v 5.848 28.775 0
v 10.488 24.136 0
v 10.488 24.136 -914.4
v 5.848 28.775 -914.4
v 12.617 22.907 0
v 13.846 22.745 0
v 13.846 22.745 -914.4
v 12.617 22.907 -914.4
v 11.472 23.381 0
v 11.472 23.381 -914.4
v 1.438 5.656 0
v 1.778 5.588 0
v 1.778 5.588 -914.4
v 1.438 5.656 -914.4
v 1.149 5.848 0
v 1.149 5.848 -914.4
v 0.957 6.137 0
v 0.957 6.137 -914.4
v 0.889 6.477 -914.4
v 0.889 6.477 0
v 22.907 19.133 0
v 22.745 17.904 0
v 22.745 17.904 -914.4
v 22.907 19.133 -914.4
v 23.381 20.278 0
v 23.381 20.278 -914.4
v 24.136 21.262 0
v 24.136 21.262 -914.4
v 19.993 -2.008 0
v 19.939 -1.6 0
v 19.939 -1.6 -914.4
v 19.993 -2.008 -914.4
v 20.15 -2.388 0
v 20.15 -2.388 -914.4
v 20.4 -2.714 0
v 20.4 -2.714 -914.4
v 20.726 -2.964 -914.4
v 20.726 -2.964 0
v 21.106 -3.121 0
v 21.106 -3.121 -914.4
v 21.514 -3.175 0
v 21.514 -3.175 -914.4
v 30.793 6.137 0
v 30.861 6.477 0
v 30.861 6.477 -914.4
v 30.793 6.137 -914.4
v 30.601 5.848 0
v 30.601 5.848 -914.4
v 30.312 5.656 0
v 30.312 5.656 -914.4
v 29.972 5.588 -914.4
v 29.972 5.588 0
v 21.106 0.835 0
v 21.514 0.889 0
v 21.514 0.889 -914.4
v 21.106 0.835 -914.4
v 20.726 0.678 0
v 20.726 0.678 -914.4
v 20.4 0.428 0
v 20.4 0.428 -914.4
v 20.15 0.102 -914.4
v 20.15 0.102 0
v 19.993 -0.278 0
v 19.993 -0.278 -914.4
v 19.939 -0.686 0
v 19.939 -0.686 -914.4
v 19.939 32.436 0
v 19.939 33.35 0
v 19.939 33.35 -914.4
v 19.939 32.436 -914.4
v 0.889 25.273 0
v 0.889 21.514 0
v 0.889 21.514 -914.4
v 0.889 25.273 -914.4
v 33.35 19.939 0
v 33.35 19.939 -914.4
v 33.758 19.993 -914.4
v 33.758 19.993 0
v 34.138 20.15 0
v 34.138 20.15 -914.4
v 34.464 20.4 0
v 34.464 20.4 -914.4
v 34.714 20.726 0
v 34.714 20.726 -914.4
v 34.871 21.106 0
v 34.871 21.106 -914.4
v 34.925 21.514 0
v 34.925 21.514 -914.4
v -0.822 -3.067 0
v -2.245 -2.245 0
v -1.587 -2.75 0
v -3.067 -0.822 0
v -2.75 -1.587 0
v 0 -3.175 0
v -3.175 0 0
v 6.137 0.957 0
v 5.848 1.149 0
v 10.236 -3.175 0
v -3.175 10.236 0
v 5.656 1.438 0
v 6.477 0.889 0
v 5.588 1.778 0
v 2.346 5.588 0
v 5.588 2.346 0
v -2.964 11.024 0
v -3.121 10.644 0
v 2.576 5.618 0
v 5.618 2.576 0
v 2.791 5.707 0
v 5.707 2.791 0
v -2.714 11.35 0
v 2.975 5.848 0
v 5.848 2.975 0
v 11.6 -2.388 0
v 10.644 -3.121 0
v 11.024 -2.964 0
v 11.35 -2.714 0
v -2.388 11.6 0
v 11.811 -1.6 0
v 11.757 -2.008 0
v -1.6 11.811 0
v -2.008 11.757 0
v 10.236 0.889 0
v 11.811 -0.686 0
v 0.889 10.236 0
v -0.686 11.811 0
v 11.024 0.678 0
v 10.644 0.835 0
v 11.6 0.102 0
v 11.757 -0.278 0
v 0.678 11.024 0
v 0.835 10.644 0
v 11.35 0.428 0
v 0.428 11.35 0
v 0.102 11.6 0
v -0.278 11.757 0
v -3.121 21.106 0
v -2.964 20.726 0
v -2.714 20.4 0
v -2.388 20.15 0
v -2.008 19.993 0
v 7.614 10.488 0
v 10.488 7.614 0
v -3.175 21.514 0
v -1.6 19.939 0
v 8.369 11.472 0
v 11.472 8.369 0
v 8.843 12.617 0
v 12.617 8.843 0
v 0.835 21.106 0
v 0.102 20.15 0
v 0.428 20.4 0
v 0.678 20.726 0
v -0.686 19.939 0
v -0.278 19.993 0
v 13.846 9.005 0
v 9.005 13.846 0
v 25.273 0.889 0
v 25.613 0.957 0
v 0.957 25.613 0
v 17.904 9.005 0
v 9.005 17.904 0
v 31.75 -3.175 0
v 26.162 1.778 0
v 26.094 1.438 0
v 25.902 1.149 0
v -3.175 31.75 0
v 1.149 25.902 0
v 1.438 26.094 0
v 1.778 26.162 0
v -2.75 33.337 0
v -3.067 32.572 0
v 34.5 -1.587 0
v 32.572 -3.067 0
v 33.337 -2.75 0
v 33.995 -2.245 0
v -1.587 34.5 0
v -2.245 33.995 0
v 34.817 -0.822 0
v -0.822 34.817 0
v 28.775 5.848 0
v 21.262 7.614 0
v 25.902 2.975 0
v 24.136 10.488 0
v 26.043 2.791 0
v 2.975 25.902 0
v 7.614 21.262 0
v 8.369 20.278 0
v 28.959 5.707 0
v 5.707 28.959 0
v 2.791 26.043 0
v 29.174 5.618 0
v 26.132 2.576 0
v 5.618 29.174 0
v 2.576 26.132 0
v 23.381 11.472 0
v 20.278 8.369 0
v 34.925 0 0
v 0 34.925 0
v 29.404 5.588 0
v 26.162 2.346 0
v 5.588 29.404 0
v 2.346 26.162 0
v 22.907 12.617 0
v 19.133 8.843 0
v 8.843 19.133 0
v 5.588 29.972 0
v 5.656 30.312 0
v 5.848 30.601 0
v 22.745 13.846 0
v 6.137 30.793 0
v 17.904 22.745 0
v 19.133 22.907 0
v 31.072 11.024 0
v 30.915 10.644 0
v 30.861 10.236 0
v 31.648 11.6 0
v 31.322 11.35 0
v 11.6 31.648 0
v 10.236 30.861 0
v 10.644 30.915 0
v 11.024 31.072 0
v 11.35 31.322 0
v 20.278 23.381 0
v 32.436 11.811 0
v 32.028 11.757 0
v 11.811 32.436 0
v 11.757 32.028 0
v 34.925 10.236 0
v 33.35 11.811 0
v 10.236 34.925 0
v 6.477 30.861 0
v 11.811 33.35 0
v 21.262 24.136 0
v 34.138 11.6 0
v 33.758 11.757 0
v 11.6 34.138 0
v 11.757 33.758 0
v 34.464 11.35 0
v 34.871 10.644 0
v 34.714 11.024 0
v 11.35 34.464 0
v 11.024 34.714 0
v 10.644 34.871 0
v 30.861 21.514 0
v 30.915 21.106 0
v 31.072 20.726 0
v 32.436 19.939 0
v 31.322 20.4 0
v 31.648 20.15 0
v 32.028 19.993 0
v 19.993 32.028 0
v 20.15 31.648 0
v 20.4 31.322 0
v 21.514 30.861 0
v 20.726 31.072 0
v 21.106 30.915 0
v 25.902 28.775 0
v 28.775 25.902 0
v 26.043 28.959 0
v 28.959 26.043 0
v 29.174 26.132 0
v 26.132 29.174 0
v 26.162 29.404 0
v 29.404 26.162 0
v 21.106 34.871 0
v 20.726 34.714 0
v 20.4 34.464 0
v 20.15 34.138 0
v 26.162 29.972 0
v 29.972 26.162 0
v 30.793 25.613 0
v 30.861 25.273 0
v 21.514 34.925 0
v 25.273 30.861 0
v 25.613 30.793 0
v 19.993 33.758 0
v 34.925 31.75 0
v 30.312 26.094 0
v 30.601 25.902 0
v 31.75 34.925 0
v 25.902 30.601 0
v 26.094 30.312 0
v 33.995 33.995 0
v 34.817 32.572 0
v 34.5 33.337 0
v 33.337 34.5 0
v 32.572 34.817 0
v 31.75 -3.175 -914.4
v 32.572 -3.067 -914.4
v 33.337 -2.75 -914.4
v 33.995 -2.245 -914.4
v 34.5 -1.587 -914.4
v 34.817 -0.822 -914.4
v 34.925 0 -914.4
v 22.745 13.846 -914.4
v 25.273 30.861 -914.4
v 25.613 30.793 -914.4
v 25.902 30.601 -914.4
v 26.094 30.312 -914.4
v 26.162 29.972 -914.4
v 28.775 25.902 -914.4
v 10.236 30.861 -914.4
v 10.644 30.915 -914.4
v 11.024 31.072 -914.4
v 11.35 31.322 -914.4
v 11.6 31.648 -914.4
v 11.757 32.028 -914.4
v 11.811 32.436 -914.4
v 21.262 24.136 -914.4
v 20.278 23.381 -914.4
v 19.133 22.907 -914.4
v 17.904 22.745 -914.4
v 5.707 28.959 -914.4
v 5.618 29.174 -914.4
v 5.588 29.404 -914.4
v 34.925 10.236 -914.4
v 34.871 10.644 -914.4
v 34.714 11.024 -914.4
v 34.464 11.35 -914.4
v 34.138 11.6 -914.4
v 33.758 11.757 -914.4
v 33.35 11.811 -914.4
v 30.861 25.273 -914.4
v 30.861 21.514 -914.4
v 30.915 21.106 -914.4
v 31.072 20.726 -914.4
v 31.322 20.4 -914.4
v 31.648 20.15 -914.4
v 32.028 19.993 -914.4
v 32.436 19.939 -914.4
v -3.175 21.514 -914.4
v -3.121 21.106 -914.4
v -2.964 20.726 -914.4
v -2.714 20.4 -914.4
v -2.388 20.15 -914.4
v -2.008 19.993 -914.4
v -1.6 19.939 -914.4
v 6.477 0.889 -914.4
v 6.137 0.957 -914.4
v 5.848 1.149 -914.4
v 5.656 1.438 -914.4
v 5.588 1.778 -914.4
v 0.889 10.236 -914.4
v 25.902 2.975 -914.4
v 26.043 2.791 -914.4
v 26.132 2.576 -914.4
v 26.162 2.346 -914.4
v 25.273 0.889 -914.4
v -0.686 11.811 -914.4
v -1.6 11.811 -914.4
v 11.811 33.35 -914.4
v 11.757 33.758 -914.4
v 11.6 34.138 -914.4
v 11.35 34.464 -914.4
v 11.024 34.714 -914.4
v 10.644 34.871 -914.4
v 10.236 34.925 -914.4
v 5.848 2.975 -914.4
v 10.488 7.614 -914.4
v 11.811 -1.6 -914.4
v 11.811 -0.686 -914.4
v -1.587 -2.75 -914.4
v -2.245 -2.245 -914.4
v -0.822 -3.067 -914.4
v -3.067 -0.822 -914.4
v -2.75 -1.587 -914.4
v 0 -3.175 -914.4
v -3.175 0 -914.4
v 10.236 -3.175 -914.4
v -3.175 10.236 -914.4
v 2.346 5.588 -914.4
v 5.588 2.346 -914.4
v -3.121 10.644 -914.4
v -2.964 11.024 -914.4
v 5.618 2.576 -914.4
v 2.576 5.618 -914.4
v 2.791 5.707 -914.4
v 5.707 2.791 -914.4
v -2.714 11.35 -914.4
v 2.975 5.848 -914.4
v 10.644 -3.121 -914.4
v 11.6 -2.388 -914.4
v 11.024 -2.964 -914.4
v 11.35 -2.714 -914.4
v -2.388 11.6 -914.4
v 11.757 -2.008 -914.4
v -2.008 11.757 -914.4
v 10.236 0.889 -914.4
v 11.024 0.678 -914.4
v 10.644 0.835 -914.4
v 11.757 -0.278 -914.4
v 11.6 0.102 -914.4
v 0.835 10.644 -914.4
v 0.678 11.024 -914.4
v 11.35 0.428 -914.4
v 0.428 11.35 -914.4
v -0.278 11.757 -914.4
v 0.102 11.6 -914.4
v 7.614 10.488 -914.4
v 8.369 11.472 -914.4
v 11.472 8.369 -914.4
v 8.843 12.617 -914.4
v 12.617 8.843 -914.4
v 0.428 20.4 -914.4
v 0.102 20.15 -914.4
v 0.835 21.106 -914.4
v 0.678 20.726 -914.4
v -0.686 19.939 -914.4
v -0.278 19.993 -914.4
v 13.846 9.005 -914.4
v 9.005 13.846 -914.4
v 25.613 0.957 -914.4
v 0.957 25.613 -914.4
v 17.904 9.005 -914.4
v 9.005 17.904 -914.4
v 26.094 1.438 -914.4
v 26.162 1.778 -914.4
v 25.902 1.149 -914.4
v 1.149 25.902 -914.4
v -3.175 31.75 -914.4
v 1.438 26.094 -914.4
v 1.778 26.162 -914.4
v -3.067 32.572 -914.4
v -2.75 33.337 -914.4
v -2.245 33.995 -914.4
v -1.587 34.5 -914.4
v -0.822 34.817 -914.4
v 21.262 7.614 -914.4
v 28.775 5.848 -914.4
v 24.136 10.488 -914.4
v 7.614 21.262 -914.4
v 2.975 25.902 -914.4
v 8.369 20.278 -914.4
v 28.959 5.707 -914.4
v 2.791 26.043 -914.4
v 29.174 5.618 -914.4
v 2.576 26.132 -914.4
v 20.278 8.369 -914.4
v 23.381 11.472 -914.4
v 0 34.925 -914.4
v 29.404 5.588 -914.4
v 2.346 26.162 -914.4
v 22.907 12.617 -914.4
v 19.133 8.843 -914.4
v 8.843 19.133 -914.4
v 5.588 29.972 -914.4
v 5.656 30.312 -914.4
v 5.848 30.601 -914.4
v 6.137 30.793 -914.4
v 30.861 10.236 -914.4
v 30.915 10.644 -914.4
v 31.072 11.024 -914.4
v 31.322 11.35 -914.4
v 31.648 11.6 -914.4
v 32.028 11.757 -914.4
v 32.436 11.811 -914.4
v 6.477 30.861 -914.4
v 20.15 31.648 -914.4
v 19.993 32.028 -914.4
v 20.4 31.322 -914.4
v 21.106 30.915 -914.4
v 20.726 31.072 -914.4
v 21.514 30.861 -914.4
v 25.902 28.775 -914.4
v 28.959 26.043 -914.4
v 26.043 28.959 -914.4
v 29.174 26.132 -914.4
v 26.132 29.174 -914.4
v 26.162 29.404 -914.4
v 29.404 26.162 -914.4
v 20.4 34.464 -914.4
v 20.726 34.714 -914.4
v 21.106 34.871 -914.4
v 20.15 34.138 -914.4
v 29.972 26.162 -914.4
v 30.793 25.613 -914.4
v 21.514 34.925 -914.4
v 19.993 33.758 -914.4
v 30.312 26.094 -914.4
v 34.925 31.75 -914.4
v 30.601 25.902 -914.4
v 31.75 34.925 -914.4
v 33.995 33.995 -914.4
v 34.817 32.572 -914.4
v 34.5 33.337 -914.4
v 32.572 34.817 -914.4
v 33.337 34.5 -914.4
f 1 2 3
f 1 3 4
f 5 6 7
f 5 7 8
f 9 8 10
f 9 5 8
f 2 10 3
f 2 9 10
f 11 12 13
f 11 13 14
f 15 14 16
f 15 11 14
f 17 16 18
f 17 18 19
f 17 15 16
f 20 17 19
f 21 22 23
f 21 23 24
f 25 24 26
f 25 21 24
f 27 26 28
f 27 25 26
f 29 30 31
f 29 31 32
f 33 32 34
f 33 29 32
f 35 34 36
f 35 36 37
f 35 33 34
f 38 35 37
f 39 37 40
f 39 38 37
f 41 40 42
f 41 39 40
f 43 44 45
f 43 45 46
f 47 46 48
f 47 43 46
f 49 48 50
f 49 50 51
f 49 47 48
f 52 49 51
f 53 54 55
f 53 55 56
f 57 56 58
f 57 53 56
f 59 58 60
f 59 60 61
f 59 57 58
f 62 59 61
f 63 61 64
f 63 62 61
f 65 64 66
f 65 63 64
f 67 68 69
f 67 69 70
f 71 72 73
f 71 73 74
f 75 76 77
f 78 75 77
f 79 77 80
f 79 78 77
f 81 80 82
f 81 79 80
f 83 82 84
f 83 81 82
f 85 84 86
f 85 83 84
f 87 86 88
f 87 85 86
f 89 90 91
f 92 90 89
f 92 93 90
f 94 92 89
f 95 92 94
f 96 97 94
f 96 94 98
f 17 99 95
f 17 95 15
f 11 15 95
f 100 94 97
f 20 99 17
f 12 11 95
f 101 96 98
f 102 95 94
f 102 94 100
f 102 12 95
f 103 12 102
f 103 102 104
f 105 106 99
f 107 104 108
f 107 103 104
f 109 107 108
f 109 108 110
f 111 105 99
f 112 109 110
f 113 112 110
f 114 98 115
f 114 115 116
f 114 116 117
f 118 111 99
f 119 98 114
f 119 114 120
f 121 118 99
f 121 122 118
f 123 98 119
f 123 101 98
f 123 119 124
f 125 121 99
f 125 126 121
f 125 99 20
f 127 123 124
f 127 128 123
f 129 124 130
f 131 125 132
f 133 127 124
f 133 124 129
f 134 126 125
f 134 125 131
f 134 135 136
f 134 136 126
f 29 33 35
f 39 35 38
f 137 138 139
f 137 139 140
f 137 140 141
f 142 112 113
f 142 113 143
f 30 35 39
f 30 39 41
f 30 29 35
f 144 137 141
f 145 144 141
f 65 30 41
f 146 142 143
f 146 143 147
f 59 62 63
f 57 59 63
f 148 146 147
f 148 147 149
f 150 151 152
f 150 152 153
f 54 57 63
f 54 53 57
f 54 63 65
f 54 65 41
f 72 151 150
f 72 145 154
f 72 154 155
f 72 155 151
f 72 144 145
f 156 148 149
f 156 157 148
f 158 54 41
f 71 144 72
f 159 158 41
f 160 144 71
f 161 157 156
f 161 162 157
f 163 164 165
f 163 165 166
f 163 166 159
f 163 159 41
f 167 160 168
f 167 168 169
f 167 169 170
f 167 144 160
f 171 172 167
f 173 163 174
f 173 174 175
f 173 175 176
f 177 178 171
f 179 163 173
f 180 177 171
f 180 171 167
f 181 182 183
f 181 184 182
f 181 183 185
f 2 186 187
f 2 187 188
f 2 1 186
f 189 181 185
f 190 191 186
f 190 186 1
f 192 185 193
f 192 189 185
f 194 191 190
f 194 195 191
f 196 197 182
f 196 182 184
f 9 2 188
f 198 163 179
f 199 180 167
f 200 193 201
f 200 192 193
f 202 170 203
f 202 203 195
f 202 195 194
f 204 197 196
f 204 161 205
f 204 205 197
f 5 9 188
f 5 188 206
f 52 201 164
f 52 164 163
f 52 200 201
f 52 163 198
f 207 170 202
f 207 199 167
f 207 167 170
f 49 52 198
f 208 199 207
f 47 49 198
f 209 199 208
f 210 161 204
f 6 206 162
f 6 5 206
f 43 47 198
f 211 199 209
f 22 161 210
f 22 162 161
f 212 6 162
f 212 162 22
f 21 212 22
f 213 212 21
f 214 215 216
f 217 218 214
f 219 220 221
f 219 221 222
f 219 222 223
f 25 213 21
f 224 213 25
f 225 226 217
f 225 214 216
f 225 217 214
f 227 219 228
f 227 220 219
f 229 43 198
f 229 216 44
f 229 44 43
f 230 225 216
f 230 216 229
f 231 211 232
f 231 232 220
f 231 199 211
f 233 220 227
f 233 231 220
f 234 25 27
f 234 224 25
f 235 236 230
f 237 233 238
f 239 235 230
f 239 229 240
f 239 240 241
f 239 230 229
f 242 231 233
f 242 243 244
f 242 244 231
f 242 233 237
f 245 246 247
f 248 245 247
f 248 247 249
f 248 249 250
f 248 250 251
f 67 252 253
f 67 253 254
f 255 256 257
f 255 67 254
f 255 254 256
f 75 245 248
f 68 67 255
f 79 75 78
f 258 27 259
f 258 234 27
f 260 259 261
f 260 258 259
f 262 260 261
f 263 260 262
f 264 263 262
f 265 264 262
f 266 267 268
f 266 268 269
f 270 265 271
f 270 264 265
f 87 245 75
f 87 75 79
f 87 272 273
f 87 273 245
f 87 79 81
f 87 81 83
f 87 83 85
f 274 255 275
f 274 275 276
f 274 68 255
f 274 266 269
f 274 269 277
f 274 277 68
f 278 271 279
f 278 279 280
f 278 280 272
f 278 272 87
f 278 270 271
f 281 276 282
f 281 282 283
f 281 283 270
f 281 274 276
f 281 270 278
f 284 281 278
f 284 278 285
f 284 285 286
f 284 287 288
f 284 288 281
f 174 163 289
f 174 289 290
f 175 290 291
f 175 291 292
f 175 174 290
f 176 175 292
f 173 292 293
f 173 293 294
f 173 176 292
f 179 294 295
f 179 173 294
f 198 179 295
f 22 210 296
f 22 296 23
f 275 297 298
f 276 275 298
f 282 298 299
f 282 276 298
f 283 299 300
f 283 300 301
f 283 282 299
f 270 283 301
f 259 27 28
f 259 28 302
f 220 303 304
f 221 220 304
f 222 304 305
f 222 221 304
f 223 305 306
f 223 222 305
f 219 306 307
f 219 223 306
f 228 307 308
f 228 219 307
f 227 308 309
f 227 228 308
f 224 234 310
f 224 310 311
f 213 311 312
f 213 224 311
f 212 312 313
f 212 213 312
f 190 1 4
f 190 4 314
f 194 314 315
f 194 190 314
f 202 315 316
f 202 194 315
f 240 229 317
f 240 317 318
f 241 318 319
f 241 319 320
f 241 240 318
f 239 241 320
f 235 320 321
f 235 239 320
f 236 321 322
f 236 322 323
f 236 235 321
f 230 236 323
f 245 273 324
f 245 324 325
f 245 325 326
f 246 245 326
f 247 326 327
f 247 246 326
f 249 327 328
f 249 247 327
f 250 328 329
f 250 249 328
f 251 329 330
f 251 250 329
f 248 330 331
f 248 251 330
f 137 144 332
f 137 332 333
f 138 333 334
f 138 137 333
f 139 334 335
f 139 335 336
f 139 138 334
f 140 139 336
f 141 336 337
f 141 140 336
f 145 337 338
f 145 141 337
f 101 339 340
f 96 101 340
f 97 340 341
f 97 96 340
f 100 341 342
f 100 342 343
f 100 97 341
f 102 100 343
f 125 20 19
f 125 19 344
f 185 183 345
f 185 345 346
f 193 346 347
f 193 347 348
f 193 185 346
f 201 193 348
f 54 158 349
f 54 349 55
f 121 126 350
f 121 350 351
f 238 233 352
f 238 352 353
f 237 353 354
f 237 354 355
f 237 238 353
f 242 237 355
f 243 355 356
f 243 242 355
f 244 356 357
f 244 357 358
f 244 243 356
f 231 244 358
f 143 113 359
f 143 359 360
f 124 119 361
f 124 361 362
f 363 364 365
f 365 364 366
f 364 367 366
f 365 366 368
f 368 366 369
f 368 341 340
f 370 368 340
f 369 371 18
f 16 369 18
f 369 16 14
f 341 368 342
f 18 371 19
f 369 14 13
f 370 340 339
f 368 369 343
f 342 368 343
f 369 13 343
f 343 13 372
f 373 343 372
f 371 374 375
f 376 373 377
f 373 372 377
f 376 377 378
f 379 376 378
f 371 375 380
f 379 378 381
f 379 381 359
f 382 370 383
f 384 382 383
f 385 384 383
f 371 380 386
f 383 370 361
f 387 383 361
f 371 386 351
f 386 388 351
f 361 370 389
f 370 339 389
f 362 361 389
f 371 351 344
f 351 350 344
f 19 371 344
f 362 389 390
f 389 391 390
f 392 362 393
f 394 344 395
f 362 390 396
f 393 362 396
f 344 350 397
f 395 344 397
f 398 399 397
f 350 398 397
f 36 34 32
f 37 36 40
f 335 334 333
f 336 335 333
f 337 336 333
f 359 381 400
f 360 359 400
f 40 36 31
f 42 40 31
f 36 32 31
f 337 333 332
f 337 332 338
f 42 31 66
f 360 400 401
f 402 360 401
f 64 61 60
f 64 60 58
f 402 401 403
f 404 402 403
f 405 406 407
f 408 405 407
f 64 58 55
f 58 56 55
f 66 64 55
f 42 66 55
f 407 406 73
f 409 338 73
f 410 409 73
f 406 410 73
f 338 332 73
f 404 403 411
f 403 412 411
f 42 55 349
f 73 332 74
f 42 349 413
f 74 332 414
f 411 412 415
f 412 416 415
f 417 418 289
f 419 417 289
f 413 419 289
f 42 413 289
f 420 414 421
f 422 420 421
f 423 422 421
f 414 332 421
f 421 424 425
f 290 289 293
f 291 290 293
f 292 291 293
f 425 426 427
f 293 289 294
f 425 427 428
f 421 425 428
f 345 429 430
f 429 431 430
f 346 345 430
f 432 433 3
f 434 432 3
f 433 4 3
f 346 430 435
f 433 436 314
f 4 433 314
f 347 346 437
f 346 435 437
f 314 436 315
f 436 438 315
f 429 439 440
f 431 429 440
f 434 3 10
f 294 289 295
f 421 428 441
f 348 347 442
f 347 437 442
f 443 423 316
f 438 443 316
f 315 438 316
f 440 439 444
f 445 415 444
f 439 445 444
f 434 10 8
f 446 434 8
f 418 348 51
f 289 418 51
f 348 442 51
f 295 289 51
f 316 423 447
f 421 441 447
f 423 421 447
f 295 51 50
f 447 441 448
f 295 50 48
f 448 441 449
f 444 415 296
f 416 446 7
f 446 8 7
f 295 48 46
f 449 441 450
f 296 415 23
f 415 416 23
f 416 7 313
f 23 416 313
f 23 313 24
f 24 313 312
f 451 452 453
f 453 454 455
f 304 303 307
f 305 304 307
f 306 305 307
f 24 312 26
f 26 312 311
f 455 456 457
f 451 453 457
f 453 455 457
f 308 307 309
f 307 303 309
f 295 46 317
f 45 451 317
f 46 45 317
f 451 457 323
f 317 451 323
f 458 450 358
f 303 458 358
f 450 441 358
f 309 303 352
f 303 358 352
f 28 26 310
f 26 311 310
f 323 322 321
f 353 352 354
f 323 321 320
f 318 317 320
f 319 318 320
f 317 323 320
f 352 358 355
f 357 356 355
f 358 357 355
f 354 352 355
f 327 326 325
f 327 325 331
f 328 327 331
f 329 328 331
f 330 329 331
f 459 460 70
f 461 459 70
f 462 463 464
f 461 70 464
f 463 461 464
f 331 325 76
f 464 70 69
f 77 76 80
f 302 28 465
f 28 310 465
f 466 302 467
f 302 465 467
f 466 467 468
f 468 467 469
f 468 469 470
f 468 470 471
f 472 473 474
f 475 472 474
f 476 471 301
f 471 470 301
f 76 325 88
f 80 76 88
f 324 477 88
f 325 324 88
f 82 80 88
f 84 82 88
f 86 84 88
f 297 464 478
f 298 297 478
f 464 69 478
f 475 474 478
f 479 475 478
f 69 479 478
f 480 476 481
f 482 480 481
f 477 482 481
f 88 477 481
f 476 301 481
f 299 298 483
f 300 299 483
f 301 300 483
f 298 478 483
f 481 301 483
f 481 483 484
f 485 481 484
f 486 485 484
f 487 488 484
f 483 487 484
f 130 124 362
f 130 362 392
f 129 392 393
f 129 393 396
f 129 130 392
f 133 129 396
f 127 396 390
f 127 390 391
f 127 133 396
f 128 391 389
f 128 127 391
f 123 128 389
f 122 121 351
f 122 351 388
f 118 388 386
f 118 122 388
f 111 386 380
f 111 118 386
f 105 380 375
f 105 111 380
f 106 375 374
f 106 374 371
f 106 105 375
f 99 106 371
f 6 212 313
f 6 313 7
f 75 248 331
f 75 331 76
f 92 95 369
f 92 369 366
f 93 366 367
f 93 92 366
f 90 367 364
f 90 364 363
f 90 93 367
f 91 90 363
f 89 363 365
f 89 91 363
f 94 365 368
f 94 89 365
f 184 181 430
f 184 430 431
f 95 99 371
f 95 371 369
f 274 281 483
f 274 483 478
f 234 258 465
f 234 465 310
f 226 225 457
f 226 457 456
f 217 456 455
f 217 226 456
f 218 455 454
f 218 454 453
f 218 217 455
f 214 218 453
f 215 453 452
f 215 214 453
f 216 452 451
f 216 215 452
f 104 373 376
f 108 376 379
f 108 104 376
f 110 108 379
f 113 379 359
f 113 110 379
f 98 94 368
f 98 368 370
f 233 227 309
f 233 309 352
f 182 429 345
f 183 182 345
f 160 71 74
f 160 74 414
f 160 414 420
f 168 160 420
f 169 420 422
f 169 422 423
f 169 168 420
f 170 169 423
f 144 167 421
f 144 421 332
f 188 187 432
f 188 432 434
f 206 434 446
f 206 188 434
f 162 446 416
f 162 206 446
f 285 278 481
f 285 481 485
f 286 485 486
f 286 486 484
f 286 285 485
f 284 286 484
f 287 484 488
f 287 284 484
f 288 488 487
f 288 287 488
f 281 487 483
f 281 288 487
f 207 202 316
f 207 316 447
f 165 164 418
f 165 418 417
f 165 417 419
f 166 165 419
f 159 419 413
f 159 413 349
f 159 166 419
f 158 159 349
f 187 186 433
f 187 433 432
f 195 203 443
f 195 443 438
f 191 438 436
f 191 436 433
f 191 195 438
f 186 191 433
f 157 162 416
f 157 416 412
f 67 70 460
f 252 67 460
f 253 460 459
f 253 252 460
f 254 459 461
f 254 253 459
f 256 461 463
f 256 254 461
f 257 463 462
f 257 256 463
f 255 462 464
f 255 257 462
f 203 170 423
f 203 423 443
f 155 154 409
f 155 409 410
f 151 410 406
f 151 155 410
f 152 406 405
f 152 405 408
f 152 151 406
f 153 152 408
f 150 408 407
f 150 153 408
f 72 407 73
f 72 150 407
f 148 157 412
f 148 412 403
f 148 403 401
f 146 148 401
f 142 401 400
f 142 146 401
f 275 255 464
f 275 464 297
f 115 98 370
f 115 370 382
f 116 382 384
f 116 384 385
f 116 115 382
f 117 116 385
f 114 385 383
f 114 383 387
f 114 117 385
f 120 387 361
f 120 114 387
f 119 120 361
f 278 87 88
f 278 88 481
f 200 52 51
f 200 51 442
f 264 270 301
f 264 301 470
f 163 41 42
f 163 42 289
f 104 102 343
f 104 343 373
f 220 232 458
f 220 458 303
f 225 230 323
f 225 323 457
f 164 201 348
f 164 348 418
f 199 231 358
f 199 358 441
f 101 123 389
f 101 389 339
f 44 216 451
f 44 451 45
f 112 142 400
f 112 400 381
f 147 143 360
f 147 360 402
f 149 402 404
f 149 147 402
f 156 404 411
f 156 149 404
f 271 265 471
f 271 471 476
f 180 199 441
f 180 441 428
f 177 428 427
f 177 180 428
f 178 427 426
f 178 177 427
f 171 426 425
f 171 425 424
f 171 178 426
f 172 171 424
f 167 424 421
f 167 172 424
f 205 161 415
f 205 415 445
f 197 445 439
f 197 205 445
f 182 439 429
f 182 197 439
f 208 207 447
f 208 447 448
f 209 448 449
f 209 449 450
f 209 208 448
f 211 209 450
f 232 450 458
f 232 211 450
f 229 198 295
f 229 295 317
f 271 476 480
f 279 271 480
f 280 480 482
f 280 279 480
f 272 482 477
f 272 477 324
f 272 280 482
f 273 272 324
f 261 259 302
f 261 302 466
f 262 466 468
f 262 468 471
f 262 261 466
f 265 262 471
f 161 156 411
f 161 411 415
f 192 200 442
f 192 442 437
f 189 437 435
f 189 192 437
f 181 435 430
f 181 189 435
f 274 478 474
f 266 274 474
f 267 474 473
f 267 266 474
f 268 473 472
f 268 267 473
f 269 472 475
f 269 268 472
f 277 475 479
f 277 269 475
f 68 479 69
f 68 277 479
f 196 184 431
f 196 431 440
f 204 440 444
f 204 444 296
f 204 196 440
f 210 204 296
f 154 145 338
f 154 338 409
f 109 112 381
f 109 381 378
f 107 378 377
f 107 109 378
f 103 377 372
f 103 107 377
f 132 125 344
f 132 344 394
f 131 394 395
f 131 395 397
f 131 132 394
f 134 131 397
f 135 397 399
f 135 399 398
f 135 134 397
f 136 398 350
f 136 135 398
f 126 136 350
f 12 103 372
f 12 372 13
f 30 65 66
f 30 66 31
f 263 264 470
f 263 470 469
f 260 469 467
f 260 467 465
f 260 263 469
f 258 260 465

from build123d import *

# Parameters (mm, degrees)
F1_DEPTH = 914.4


with BuildPart() as f1:
    # F0 (on Top) → F1 (new body)
    with BuildSketch(Plane.XY):
        with BuildLine():
            ThreePointArc((0, 34.925), (-2.245064, 33.995064), (-3.175, 31.75))
            Line((-3.175, 31.75), (-3.175, 21.5138))
            ThreePointArc((-3.175, 21.5138), (-2.713752, 20.400248), (-1.6002, 19.939))
            Line((-1.6002, 19.939), (-0.6858, 19.939))
            ThreePointArc((-0.6858, 19.939), (0.427752, 20.400248), (0.889, 21.5138))
            Line((0.889, 21.5138), (0.889, 25.273))
            ThreePointArc((0.889, 25.273), (1.149382, 25.901618), (1.778, 26.162))
            Line((1.778, 26.162), (2.346082, 26.162))
            ThreePointArc((2.346082, 26.162), (2.686288, 26.094329), (2.9747, 25.901618))
            Line((2.9747, 25.901618), (7.61416, 21.262158))
            ThreePointArc((7.61416, 21.262158), (8.643787, 19.721212), (9.005344, 17.903543))
            Line((9.005344, 17.903543), (9.005344, 13.846457))
            ThreePointArc((9.005344, 13.846457), (8.643787, 12.028788), (7.61416, 10.487842))
            Line((7.61416, 10.487842), (2.9747, 5.848382))
            ThreePointArc((2.9747, 5.848382), (2.686288, 5.655671), (2.346082, 5.588))
            Line((2.346082, 5.588), (1.778, 5.588))
            ThreePointArc((1.778, 5.588), (1.149382, 5.848382), (0.889, 6.477))
            Line((0.889, 6.477), (0.889, 10.2362))
            ThreePointArc((0.889, 10.2362), (0.427752, 11.349752), (-0.6858, 11.811))
            Line((-0.6858, 11.811), (-1.6002, 11.811))
            ThreePointArc((-1.6002, 11.811), (-2.713752, 11.349752), (-3.175, 10.2362))
            Line((-3.175, 10.2362), (-3.175, 0))
            ThreePointArc((-3.175, 0), (-2.245064, -2.245064), (0, -3.175))
            Line((0, -3.175), (10.2362, -3.175))
            ThreePointArc((10.2362, -3.175), (11.349752, -2.713752), (11.811, -1.6002))
            Line((11.811, -1.6002), (11.811, -0.6858))
            ThreePointArc((11.811, -0.6858), (11.349752, 0.427752), (10.2362, 0.889))
            Line((10.2362, 0.889), (6.477, 0.889))
            ThreePointArc((6.477, 0.889), (5.848382, 1.149382), (5.588, 1.778))
            Line((5.588, 1.778), (5.588, 2.346082))
            ThreePointArc((5.588, 2.346082), (5.655671, 2.686288), (5.848382, 2.9747))
            Line((5.848382, 2.9747), (10.487842, 7.61416))
            ThreePointArc((10.487842, 7.61416), (12.028788, 8.643787), (13.846457, 9.005344))
            Line((13.846457, 9.005344), (17.903543, 9.005344))
            ThreePointArc((17.903543, 9.005344), (19.721212, 8.643787), (21.262158, 7.61416))
            Line((21.262158, 7.61416), (25.901618, 2.9747))
            ThreePointArc((25.901618, 2.9747), (26.094329, 2.686288), (26.162, 2.346082))
            Line((26.162, 2.346082), (26.162, 1.778))
            ThreePointArc((26.162, 1.778), (25.901618, 1.149382), (25.273, 0.889))
            Line((25.273, 0.889), (21.5138, 0.889))
            ThreePointArc((21.5138, 0.889), (20.400248, 0.427752), (19.939, -0.6858))
            Line((19.939, -0.6858), (19.939, -1.6002))
            ThreePointArc((19.939, -1.6002), (20.400248, -2.713752), (21.5138, -3.175))
            Line((21.5138, -3.175), (31.75, -3.175))
            ThreePointArc((31.75, -3.175), (33.995064, -2.245064), (34.925, 0))
            Line((34.925, 0), (34.925, 10.2362))
            ThreePointArc((34.925, 10.2362), (34.463752, 11.349752), (33.3502, 11.811))
            Line((33.3502, 11.811), (32.4358, 11.811))
            ThreePointArc((32.4358, 11.811), (31.322248, 11.349752), (30.861, 10.2362))
            Line((30.861, 10.2362), (30.861, 6.477))
            ThreePointArc((30.861, 6.477), (30.600618, 5.848382), (29.972, 5.588))
            Line((29.972, 5.588), (29.403918, 5.588))
            ThreePointArc((29.403918, 5.588), (29.063712, 5.655671), (28.7753, 5.848382))
            Line((28.7753, 5.848382), (24.13584, 10.487842))
            ThreePointArc((24.13584, 10.487842), (23.106213, 12.028788), (22.744656, 13.846457))
            Line((22.744656, 13.846457), (22.744656, 17.903543))
            ThreePointArc((22.744656, 17.903543), (23.106213, 19.721212), (24.13584, 21.262158))
            Line((24.13584, 21.262158), (28.7753, 25.901618))
            ThreePointArc((28.7753, 25.901618), (29.063712, 26.094329), (29.403918, 26.162))
            Line((29.403918, 26.162), (29.972, 26.162))
            ThreePointArc((29.972, 26.162), (30.600618, 25.901618), (30.861, 25.273))
            Line((30.861, 25.273), (30.861, 21.5138))
            ThreePointArc((30.861, 21.5138), (31.322248, 20.400248), (32.4358, 19.939))
            Line((32.4358, 19.939), (33.3502, 19.939))
            ThreePointArc((33.3502, 19.939), (34.463752, 20.400248), (34.925, 21.5138))
            Line((34.925, 21.5138), (34.925, 31.75))
            ThreePointArc((34.925, 31.75), (33.995064, 33.995064), (31.75, 34.925))
            Line((31.75, 34.925), (21.5138, 34.925))
            ThreePointArc((21.5138, 34.925), (20.400248, 34.463752), (19.939, 33.3502))
            Line((19.939, 33.3502), (19.939, 32.4358))
            ThreePointArc((19.939, 32.4358), (20.400248, 31.322248), (21.5138, 30.861))
            Line((21.5138, 30.861), (25.273, 30.861))
            ThreePointArc((25.273, 30.861), (25.901618, 30.600618), (26.162, 29.972))
            Line((26.162, 29.972), (26.162, 29.403918))
            ThreePointArc((26.162, 29.403918), (26.094329, 29.063712), (25.901618, 28.7753))
            Line((25.901618, 28.7753), (21.262158, 24.13584))
            ThreePointArc((21.262158, 24.13584), (19.721212, 23.106213), (17.903543, 22.744656))
            Line((17.903543, 22.744656), (13.846457, 22.744656))
            ThreePointArc((13.846457, 22.744656), (12.028788, 23.106213), (10.487842, 24.13584))
            Line((10.487842, 24.13584), (5.848382, 28.7753))
            ThreePointArc((5.848382, 28.7753), (5.655671, 29.063712), (5.588, 29.403918))
            Line((5.588, 29.403918), (5.588, 29.972))
            ThreePointArc((5.588, 29.972), (5.848382, 30.600618), (6.477, 30.861))
            Line((6.477, 30.861), (10.2362, 30.861))
            ThreePointArc((10.2362, 30.861), (11.349752, 31.322248), (11.811, 32.4358))
            Line((11.811, 32.4358), (11.811, 33.3502))
            ThreePointArc((11.811, 33.3502), (11.349752, 34.463752), (10.2362, 34.925))
            Line((10.2362, 34.925), (0, 34.925))
        make_face()
    extrude(amount=-F1_DEPTH)


solid = f1.part
